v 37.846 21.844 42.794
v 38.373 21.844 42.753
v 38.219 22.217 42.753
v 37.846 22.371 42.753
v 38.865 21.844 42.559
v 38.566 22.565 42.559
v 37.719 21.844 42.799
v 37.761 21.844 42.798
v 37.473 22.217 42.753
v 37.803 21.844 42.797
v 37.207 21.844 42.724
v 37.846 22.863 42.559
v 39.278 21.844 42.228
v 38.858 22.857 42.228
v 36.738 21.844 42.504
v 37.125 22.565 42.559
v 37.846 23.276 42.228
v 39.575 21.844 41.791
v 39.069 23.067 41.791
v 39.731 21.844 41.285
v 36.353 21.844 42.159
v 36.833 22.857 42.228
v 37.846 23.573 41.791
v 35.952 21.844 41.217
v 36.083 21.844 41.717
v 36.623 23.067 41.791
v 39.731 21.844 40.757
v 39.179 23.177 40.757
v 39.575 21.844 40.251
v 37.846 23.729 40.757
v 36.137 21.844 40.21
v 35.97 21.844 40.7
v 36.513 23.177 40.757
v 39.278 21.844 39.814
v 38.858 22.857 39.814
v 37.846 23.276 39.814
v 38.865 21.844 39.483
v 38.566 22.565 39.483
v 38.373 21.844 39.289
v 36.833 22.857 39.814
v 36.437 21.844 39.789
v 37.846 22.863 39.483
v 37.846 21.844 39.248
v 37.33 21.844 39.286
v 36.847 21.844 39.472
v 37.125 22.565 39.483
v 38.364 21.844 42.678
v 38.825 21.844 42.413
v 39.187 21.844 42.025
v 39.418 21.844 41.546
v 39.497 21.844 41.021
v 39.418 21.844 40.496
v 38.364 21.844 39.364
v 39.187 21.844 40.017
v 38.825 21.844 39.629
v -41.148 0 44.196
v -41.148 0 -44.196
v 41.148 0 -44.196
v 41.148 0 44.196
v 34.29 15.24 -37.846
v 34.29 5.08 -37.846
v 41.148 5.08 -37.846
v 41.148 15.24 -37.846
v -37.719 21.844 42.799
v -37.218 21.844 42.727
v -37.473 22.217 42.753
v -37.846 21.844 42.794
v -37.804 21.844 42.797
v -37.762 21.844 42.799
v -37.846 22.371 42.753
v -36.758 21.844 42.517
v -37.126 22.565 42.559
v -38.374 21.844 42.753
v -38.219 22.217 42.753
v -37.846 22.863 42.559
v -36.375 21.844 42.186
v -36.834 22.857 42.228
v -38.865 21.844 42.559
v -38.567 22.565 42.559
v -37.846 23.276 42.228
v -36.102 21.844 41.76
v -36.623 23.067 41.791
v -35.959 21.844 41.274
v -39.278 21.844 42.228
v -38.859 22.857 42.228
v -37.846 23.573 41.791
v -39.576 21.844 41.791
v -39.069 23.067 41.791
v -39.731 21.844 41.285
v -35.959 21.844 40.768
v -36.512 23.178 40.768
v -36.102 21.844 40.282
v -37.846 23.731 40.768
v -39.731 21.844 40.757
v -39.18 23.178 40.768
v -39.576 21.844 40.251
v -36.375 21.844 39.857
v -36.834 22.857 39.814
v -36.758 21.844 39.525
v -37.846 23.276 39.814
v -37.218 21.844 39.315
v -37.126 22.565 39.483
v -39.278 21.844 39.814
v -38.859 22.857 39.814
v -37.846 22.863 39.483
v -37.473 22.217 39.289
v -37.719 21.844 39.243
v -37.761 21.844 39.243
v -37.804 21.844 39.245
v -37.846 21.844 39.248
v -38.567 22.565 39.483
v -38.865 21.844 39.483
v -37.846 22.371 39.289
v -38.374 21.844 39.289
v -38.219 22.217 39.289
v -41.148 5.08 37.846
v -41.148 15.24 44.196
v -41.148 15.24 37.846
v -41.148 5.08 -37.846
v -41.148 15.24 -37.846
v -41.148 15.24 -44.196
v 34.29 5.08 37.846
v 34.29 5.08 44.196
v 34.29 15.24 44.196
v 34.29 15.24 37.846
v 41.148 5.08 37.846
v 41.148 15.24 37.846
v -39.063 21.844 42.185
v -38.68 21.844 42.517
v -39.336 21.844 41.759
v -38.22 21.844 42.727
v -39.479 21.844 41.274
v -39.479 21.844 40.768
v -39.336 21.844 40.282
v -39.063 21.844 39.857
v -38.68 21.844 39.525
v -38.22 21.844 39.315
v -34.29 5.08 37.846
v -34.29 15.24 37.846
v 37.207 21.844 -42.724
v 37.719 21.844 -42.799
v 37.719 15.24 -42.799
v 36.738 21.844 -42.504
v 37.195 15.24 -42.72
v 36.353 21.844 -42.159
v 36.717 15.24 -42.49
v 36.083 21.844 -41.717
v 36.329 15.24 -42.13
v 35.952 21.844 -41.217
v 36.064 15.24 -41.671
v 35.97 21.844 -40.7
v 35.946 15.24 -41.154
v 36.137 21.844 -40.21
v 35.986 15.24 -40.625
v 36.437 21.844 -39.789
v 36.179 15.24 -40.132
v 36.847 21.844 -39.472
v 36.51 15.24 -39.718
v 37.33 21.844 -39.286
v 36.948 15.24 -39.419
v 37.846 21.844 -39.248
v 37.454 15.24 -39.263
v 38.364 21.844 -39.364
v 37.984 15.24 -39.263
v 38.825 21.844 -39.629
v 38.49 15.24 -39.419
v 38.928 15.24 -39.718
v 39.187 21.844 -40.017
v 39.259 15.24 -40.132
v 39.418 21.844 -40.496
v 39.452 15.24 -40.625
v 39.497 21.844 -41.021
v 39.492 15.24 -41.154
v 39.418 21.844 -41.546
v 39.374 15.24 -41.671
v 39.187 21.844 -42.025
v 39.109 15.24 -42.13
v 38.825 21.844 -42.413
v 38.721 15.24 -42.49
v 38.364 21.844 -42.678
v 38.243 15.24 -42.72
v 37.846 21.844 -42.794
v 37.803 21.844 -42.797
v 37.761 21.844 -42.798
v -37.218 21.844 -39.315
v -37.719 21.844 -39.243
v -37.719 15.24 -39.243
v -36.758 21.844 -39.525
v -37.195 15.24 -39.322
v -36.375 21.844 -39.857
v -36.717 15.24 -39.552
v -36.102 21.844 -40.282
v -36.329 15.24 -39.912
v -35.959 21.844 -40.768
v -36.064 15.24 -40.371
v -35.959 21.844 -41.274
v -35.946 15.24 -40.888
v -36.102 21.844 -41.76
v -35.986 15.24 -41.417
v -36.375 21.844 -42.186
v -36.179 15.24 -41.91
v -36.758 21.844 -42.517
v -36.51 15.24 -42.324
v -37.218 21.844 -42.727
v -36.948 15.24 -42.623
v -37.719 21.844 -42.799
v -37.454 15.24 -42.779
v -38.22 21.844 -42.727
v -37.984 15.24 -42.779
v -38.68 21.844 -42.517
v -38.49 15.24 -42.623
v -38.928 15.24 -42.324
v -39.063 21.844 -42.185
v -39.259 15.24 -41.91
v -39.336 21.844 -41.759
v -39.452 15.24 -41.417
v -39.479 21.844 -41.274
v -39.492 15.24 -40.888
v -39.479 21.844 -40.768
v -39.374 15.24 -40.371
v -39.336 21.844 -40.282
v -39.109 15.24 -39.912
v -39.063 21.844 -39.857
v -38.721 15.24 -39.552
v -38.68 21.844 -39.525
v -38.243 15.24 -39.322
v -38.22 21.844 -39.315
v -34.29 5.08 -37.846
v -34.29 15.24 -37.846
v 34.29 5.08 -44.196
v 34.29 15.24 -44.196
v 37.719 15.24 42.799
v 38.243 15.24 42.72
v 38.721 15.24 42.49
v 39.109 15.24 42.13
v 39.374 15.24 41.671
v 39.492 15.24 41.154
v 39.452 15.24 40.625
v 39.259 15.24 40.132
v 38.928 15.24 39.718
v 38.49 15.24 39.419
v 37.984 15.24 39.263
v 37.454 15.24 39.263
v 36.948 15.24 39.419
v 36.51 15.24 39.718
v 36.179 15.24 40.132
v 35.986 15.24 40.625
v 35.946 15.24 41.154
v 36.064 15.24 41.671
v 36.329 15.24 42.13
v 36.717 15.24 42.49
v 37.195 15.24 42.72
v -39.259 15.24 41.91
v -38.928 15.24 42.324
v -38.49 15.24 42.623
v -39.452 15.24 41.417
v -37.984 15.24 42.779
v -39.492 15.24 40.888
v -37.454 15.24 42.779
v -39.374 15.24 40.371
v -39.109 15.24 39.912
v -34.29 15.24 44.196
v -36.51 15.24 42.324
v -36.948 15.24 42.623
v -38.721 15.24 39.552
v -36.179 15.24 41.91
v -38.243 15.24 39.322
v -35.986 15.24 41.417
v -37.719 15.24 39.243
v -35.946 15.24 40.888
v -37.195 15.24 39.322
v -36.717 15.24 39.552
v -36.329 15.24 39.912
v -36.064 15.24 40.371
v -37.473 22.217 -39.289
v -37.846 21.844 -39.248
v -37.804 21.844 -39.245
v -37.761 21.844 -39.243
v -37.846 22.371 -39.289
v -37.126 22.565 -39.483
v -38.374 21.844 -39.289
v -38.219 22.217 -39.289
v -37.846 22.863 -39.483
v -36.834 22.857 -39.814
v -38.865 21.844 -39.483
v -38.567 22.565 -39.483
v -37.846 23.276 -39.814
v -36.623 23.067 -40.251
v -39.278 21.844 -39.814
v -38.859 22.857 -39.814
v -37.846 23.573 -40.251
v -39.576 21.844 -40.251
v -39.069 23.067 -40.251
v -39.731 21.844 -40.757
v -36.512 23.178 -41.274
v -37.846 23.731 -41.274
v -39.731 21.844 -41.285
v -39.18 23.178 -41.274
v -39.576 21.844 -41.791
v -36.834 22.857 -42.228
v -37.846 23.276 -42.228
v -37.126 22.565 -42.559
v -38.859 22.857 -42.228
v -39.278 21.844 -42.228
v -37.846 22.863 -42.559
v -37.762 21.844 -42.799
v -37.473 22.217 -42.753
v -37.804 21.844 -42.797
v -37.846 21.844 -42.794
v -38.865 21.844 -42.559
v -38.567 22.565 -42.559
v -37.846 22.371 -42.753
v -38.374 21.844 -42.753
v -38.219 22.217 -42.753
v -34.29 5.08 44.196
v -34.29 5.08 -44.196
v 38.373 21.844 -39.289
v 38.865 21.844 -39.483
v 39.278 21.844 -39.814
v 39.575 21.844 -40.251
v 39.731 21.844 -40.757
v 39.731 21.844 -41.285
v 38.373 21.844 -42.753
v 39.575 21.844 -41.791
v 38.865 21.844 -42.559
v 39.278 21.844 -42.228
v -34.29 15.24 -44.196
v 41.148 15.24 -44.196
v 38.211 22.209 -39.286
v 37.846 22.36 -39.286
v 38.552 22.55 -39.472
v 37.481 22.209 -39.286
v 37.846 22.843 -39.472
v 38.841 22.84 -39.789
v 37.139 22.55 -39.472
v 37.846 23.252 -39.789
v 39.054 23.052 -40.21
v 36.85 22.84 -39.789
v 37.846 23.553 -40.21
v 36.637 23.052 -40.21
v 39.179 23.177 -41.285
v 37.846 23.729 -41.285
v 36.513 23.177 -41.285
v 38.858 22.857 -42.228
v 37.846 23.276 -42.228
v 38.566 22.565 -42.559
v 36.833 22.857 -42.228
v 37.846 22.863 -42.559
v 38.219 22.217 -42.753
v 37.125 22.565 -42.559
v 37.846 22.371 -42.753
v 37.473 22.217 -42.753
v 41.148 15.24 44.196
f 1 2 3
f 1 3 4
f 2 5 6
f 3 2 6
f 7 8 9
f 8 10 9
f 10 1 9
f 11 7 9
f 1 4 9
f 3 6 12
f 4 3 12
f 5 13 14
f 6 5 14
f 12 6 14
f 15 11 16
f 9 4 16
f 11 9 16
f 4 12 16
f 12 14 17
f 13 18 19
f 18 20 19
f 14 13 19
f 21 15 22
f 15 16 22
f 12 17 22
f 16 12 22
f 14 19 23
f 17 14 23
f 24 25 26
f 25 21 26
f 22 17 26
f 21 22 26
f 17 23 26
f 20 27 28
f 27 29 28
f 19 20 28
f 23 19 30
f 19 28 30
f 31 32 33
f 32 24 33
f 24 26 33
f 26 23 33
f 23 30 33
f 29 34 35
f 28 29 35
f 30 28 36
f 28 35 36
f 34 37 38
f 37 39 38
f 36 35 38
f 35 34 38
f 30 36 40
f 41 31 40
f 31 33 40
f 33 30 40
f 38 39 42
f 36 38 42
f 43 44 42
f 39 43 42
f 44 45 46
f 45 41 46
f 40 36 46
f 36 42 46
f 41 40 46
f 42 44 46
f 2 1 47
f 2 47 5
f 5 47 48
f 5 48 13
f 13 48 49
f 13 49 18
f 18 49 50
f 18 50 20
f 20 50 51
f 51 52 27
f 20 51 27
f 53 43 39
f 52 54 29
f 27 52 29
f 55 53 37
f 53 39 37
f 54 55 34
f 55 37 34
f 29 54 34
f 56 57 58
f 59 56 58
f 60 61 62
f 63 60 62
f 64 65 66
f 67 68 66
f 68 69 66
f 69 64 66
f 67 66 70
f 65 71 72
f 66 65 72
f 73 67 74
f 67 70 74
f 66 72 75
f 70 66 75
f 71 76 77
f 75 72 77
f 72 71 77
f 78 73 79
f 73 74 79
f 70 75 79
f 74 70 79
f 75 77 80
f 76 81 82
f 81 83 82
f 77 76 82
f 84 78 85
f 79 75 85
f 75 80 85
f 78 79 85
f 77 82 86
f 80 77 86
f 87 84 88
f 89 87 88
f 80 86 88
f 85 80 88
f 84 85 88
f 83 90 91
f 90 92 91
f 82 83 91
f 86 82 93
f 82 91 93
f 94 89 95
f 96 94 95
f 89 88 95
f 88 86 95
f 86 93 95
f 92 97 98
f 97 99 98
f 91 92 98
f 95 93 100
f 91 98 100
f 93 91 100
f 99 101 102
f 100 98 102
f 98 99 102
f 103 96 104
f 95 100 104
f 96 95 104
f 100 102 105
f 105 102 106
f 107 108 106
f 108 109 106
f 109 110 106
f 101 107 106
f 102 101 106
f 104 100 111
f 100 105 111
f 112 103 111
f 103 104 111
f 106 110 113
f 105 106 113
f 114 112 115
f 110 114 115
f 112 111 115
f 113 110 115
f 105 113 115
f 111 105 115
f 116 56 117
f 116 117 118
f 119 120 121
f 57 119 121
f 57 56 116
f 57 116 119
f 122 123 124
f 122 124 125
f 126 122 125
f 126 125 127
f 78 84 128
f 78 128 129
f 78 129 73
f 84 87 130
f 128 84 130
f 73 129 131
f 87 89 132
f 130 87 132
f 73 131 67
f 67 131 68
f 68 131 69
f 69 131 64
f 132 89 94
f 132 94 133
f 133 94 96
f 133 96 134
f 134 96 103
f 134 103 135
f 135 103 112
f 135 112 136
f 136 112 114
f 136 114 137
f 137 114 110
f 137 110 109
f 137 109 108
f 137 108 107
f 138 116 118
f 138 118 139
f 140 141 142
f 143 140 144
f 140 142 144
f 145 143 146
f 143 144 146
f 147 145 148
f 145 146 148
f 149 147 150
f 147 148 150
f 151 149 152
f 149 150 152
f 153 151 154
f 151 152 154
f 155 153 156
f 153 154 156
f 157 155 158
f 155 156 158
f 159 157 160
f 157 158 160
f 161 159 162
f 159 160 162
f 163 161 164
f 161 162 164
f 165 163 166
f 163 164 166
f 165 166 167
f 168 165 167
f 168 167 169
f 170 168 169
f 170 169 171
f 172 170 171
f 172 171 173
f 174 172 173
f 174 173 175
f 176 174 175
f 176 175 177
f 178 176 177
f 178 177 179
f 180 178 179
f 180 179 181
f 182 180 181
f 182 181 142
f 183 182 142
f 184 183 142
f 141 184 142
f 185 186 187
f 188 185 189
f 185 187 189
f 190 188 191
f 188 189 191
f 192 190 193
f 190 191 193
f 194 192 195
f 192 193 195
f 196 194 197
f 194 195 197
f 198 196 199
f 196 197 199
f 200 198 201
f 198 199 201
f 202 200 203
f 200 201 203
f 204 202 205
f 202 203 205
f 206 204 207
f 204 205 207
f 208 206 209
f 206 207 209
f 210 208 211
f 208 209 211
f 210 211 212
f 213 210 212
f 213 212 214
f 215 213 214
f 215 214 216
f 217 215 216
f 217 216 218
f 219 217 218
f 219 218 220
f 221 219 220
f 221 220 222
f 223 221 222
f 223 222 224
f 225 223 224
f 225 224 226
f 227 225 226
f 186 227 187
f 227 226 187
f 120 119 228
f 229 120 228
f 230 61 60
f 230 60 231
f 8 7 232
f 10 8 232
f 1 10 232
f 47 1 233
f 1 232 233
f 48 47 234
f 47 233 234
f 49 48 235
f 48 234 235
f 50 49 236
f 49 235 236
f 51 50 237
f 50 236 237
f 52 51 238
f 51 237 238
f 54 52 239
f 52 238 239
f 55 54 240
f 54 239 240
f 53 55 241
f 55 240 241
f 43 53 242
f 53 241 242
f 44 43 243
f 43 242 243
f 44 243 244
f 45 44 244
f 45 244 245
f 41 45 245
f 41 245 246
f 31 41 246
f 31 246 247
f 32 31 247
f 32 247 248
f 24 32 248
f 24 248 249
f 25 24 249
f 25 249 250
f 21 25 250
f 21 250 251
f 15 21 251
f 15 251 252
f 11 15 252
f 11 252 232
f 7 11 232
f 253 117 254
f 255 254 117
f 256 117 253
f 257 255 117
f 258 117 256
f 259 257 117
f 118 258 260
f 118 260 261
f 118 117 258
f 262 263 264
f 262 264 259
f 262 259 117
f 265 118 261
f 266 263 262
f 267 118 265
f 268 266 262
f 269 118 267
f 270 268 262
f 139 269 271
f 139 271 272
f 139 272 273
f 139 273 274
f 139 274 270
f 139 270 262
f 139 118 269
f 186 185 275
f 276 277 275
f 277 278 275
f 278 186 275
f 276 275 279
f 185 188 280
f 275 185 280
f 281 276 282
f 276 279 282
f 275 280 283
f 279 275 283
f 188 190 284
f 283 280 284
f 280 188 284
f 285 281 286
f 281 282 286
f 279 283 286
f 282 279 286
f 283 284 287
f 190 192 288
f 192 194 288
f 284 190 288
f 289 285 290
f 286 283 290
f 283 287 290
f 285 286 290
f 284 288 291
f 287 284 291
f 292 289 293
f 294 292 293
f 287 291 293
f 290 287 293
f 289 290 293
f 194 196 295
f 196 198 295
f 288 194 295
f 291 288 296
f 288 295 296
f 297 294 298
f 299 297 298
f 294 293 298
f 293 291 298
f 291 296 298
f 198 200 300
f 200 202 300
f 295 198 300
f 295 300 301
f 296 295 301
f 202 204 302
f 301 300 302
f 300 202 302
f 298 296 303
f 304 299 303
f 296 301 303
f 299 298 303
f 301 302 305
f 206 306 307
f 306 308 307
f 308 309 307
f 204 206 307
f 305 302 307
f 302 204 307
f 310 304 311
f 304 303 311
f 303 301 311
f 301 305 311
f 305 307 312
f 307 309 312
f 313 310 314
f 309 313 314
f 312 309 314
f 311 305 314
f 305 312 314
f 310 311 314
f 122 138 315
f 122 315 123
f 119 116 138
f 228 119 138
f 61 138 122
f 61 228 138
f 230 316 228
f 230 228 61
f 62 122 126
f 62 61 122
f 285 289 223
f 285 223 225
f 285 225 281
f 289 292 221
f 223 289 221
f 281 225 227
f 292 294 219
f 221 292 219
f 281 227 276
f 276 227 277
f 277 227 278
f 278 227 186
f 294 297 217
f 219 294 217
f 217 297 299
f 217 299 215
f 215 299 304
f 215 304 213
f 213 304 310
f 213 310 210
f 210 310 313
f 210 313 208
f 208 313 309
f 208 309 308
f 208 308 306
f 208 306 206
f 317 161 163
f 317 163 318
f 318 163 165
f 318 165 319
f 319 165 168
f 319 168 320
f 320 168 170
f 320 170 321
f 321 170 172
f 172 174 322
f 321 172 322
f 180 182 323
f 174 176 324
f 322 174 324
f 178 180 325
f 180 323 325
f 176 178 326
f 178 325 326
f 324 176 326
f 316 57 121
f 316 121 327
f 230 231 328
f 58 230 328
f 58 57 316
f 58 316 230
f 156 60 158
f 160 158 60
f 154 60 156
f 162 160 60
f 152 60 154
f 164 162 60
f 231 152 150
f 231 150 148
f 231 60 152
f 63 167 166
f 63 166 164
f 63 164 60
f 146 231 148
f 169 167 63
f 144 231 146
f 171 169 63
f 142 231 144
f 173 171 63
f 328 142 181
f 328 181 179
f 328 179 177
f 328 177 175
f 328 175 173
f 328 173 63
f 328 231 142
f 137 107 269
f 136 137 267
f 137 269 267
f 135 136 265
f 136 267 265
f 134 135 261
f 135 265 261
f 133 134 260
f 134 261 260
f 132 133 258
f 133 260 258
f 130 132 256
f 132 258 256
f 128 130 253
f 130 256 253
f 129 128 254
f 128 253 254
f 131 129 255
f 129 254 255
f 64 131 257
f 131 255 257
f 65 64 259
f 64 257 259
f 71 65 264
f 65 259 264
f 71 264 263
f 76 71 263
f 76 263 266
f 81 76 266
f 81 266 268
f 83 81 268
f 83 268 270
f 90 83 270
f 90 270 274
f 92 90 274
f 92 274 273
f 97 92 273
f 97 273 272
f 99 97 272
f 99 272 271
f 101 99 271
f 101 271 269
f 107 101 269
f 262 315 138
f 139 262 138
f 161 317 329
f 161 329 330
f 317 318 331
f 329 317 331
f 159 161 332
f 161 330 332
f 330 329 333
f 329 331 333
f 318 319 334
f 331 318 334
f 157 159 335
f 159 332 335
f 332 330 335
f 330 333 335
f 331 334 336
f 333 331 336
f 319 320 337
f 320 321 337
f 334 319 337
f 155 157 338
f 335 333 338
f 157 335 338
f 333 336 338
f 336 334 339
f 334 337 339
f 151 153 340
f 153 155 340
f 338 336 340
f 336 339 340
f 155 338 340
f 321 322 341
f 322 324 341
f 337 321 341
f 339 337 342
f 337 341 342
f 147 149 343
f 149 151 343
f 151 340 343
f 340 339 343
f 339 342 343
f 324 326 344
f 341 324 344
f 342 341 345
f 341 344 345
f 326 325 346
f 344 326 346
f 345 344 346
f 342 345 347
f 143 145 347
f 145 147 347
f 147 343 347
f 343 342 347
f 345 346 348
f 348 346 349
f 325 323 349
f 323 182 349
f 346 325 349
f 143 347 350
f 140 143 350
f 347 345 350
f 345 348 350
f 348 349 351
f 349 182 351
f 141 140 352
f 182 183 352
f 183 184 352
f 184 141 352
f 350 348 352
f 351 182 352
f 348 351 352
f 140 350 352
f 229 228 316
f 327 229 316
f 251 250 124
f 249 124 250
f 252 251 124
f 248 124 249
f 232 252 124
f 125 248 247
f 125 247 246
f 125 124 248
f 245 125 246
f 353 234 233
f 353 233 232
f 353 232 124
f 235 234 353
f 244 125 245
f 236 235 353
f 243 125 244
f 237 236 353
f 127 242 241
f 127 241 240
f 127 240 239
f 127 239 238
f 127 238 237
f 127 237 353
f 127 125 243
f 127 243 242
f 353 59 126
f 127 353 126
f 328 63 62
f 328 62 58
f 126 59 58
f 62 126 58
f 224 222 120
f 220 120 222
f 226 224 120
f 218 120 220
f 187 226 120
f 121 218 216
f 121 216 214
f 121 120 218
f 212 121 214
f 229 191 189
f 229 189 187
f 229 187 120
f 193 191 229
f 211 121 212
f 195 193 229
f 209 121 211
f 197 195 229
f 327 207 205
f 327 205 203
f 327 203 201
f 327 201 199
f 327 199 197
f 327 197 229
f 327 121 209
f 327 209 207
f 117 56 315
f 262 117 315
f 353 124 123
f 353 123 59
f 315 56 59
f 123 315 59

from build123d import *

# Parameters (mm, degrees)
SKETCH2_R             = 1.778
BOSS_EXTRUDE2_DEPTH   = 21.844
BOSS_EXTRUDE2_2_DEPTH = 21.844
BOSS_EXTRUDE2_3_DEPTH = 21.844
BOSS_EXTRUDE2_4_DEPTH = 21.844
SKETCH2_4_W           = 82.296
SKETCH2_4_H           = 88.392
BOSS_EXTRUDE3_DEPTH   = 5.08
REVOLVE1_ANGLE        = 180
LPATTERN1_COUNT       = 2
LPATTERN1_PITCH       = 75.692
LPATTERN1_COUNT_DIR2  = 2
LPATTERN1_PITCH_DIR2  = 82.042
SKETCH5_W             = 6.858
SKETCH5_H             = 6.35
BOSS_EXTRUDE4_DEPTH   = 10.16


with BuildPart() as part:
    # Sketch2 → Boss-Extrude2 (new body)
    with BuildSketch(Plane(origin=(0, 0, 0), x_dir=(1, 0, 0), z_dir=(0, 1, 0))):
        with Locations((37.719, -41.021)):
            Circle(SKETCH2_R)
    extrude(amount=BOSS_EXTRUDE2_DEPTH)



with BuildPart() as body_2:
    # Sketch2 → Boss-Extrude2 2 (new body)
    with BuildSketch(Plane(origin=(0, 0, 0), x_dir=(1, 0, 0), z_dir=(0, 1, 0))):
        with Locations((-37.719, -41.021)):
            Circle(SKETCH2_R)
    extrude(amount=BOSS_EXTRUDE2_2_DEPTH)


with BuildPart() as body_3:
    # Sketch2 → Boss-Extrude2 3 (new body)
    with BuildSketch(Plane(origin=(0, 0, 0), x_dir=(1, 0, 0), z_dir=(0, 1, 0))):
        with Locations((37.719, 41.021)):
            Circle(SKETCH2_R)
    extrude(amount=BOSS_EXTRUDE2_3_DEPTH)


with BuildPart() as body_4:
    # Sketch2 → Boss-Extrude2 4 (new body)
    with BuildSketch(Plane(origin=(0, 0, 0), x_dir=(1, 0, 0), z_dir=(0, 1, 0))):
        with Locations((-37.719, 41.021)):
            Circle(SKETCH2_R)
    extrude(amount=BOSS_EXTRUDE2_4_DEPTH)


with BuildPart() as part_1:
    add(part.part)

    add(body_2.part)  # Boss-Extrude3 merges body 2

    add(body_3.part)  # Boss-Extrude3 merges body 3

    add(body_4.part)  # Boss-Extrude3 merges body 4
    # Sketch2<4> → Boss-Extrude3 (add)
    with BuildSketch(Plane(origin=(0, 0, 0), x_dir=(1, 0, 0), z_dir=(0, 1, 0))):
        Rectangle(SKETCH2_4_W, SKETCH2_4_H)
    extrude(amount=BOSS_EXTRUDE3_DEPTH)

    # Sketch3 → Revolve1 (revolve)
    with BuildSketch(Plane(origin=(0, 21.844, 0), x_dir=(1, 0, 0), z_dir=(0, 1, 0))):
        with BuildLine():
            Line((37.845677255, -39.247518432), (37.845677255, -42.794481568))
            ThreePointArc((37.845677255, -42.794481568), (39.75035451, -41.021), (37.845677255, -39.247518432))
        make_face()
    revolve1 = revolve(axis=Axis((37.845677255, 21.844, 39.247518432), (0, 0, 1)), revolution_arc=REVOLVE1_ANGLE)

    # LPattern1: Revolve1 2 × 2
    with Locations(*[(-i * LPATTERN1_PITCH, 0, -j * LPATTERN1_PITCH_DIR2) for i in range(LPATTERN1_COUNT) for j in range(LPATTERN1_COUNT_DIR2) if (i, j) != (0, 0)]):
        add(revolve1)

    # Sketch5 → Boss-Extrude4 (add)
    with BuildSketch(Plane(origin=(0, 5.08, 0), x_dir=(1, 0, 0), z_dir=(0, 1, 0))):
        with Locations((-37.719, 41.021)):
            Rectangle(SKETCH5_W, SKETCH5_H)
        with Locations((37.719, -41.021)):
            Rectangle(SKETCH5_W, SKETCH5_H)
        with Locations((-37.719, -41.021)):
            Rectangle(SKETCH5_W, SKETCH5_H)
        with Locations((37.719, 41.021)):
            Rectangle(SKETCH5_W, SKETCH5_H)
    extrude(amount=BOSS_EXTRUDE4_DEPTH)


solid = part_1.part
